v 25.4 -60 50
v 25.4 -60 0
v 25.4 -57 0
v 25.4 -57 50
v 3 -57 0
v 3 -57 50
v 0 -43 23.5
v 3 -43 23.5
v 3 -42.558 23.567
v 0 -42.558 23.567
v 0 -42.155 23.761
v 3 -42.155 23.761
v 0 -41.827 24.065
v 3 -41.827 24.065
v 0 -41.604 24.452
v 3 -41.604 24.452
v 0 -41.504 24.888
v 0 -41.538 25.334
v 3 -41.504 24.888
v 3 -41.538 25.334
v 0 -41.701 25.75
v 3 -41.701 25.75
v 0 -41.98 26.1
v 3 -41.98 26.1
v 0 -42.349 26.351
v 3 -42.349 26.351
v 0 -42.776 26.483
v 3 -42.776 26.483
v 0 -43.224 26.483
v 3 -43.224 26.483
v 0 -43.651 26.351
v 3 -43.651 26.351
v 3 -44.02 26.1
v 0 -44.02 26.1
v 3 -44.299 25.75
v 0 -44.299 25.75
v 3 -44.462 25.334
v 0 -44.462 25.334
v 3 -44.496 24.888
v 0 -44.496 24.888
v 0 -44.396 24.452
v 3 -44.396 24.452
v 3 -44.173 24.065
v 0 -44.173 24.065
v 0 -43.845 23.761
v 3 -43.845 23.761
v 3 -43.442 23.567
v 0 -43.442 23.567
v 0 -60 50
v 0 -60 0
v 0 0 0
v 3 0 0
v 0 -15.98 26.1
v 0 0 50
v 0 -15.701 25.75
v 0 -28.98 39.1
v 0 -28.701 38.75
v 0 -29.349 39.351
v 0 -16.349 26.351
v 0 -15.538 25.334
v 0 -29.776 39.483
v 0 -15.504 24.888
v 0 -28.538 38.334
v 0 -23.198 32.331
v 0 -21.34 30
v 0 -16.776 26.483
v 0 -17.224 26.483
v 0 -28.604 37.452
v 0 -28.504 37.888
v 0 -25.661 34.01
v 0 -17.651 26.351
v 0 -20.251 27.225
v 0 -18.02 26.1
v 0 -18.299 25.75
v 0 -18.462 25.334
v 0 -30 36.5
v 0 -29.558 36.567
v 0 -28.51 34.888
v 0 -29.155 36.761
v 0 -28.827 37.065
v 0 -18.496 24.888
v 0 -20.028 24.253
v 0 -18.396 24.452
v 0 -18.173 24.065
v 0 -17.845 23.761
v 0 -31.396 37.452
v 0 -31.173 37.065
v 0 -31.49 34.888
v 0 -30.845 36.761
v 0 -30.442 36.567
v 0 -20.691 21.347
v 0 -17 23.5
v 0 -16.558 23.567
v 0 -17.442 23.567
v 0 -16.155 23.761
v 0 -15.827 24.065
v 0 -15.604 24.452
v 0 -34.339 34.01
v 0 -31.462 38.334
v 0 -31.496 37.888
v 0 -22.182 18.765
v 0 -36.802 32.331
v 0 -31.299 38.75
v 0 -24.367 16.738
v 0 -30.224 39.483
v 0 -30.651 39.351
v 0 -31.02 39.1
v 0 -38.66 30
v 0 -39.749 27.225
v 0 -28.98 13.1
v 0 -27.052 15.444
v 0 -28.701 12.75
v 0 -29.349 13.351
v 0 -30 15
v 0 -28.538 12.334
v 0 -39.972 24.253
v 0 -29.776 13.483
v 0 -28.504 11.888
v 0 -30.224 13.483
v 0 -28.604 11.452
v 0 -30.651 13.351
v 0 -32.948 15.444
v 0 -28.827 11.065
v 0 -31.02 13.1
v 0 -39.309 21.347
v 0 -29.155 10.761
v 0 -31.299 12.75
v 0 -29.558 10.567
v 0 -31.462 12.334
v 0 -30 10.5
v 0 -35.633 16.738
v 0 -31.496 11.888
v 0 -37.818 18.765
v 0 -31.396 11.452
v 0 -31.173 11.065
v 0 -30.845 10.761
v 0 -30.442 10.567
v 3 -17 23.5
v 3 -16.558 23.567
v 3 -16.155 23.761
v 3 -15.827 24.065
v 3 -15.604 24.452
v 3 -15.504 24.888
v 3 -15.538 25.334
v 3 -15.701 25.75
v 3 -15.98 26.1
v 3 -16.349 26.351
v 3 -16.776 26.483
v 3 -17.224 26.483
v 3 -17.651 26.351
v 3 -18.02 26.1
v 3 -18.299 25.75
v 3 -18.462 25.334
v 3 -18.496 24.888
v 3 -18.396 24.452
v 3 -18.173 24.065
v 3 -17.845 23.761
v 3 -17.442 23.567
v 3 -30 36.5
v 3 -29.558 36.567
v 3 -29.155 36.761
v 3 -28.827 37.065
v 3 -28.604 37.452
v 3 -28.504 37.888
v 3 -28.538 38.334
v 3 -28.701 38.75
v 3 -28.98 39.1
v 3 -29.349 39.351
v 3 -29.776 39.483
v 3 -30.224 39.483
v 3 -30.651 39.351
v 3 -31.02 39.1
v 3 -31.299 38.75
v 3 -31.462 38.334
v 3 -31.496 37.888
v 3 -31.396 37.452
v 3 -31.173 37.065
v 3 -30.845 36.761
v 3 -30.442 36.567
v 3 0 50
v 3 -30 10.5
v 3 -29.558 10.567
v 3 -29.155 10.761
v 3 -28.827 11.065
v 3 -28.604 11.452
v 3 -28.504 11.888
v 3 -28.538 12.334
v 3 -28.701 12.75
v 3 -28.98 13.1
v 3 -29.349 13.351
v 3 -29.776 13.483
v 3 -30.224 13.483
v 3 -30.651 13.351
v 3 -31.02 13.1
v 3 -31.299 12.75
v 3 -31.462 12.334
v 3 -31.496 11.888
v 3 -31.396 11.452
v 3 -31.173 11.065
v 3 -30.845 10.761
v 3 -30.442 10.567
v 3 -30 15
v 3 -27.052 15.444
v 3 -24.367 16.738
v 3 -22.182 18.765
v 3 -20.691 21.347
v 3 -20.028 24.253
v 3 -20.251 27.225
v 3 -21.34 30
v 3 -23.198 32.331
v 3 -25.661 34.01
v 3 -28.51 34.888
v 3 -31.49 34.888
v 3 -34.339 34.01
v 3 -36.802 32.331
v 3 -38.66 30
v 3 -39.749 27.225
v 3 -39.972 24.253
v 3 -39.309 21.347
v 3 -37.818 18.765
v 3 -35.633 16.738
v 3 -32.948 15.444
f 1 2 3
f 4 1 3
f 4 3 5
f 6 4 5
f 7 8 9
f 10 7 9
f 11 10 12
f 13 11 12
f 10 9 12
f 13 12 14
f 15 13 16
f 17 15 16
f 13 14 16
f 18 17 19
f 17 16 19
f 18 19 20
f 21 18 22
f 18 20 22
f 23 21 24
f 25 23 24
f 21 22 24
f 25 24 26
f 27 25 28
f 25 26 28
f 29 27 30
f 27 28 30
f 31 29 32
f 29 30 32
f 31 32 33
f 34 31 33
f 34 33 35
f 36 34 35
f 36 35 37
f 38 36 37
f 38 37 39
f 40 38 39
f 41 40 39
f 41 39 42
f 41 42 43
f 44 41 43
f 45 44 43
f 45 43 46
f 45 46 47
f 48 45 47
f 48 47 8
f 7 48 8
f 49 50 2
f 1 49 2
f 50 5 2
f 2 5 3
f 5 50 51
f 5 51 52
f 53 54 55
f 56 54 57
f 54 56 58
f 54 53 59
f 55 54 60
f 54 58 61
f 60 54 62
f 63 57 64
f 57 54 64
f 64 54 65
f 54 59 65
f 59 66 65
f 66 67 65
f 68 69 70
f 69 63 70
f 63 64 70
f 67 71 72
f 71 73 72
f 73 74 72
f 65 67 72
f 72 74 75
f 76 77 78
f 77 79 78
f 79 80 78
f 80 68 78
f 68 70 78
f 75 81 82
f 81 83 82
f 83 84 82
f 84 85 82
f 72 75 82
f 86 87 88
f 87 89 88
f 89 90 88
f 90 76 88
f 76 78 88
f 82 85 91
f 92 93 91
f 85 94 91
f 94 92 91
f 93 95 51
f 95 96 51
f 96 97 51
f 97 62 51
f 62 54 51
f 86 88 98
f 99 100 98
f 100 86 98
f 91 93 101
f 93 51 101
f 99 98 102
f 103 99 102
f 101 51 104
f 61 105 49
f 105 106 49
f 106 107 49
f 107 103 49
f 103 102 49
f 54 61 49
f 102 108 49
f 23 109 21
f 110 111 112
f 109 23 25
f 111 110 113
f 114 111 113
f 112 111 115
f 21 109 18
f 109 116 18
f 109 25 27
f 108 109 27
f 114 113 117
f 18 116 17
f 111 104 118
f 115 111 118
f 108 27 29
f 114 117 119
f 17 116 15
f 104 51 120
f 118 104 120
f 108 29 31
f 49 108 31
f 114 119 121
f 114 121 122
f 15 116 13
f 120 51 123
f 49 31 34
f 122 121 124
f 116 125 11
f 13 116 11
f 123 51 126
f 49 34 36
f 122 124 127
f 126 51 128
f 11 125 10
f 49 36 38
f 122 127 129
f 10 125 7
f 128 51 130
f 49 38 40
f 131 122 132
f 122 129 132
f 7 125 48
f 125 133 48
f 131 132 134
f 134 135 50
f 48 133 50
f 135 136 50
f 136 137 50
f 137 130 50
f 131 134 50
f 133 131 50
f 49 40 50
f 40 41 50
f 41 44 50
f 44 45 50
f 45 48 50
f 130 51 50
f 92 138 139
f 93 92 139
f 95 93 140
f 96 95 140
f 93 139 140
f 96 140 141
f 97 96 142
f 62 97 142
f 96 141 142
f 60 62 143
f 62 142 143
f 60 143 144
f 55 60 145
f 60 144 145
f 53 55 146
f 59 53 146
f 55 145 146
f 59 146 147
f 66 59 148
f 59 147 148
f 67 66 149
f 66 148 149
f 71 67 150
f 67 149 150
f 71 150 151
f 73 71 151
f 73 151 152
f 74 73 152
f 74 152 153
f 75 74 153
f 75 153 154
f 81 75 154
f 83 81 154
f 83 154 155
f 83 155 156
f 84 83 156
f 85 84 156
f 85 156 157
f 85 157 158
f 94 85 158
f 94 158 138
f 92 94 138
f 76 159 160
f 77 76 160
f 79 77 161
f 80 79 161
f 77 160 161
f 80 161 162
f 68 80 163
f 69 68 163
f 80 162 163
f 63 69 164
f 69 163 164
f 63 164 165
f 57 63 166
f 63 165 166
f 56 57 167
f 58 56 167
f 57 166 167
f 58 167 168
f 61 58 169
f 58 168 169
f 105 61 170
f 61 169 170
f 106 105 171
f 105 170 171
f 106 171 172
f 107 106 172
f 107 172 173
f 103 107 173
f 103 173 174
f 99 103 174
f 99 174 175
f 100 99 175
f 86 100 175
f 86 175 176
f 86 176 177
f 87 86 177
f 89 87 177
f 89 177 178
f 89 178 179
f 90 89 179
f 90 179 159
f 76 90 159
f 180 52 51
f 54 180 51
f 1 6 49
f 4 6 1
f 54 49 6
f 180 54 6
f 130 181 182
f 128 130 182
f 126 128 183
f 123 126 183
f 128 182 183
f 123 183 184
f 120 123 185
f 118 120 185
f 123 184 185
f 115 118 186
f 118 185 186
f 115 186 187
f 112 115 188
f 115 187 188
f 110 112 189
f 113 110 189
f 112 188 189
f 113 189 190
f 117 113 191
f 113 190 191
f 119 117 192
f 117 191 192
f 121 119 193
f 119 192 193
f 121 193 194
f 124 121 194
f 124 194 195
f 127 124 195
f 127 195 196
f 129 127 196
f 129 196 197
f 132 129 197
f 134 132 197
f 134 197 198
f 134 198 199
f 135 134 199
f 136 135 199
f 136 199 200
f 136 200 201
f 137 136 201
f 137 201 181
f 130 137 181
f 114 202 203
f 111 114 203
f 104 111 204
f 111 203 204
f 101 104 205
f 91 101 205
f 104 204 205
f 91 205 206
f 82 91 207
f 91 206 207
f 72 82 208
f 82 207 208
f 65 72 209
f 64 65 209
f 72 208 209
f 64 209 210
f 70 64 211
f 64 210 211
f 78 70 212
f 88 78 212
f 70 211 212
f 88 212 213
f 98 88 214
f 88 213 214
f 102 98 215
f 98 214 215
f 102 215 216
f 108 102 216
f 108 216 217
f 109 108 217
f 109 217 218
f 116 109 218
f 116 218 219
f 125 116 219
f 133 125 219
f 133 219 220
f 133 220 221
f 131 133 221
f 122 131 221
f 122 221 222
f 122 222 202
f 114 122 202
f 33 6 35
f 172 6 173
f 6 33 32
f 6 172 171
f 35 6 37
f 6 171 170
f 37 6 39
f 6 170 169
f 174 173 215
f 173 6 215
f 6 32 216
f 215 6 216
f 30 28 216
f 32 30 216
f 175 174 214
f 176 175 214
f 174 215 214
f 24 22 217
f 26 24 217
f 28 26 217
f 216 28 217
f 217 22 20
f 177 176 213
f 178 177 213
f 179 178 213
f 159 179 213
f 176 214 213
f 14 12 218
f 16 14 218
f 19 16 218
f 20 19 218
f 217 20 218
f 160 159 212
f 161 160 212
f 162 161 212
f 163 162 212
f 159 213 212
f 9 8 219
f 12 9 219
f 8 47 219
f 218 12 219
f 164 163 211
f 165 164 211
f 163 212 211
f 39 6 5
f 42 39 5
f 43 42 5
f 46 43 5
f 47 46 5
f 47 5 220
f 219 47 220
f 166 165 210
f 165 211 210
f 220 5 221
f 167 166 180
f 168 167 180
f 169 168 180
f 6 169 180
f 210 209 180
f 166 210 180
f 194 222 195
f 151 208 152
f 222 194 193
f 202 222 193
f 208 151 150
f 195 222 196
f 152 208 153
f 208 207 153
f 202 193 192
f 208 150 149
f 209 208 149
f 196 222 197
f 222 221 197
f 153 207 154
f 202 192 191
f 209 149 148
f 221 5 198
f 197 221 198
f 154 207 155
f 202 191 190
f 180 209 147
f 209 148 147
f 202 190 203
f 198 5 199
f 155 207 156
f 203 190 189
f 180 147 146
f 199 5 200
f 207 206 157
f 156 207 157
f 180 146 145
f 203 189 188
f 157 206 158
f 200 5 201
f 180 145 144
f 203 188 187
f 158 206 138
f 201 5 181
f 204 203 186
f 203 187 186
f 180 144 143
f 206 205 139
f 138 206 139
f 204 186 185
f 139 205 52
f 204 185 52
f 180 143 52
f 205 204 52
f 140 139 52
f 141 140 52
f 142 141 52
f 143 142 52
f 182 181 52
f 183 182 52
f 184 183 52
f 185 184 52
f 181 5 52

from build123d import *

# Parameters (mm, degrees)
BOSS_EXTRUDE1_DEPTH = 50
SKETCH2_R           = 10
SKETCH2_R_2         = 1.5
CUT_EXTRUDE1_DEPTH  = 50


with BuildPart() as part:
    # Sketch1 → Boss-Extrude1 (new body)
    with BuildSketch(Plane.XY):
        Polygon((0, 0), (0, -60), (25.4, -60), (25.4, -57), (3, -57), (3, 0), align=None)
    extrude(amount=BOSS_EXTRUDE1_DEPTH)

    # Sketch2 → Cut-Extrude1 (cut)
    with BuildSketch(Plane(origin=(3, 0, 0), x_dir=(0, 0, -1), z_dir=(1, 0, 0))):
        with Locations((-25, -30)):
            Circle(SKETCH2_R)
        with Locations((-25, -17)):
            Circle(SKETCH2_R_2)
        with Locations((-12, -30)):
            Circle(SKETCH2_R_2)
        with Locations((-25, -43)):
            Circle(SKETCH2_R_2)
        with Locations((-38, -30)):
            Circle(SKETCH2_R_2)
    extrude(amount=-CUT_EXTRUDE1_DEPTH, mode=Mode.SUBTRACT)


solid = part.part
